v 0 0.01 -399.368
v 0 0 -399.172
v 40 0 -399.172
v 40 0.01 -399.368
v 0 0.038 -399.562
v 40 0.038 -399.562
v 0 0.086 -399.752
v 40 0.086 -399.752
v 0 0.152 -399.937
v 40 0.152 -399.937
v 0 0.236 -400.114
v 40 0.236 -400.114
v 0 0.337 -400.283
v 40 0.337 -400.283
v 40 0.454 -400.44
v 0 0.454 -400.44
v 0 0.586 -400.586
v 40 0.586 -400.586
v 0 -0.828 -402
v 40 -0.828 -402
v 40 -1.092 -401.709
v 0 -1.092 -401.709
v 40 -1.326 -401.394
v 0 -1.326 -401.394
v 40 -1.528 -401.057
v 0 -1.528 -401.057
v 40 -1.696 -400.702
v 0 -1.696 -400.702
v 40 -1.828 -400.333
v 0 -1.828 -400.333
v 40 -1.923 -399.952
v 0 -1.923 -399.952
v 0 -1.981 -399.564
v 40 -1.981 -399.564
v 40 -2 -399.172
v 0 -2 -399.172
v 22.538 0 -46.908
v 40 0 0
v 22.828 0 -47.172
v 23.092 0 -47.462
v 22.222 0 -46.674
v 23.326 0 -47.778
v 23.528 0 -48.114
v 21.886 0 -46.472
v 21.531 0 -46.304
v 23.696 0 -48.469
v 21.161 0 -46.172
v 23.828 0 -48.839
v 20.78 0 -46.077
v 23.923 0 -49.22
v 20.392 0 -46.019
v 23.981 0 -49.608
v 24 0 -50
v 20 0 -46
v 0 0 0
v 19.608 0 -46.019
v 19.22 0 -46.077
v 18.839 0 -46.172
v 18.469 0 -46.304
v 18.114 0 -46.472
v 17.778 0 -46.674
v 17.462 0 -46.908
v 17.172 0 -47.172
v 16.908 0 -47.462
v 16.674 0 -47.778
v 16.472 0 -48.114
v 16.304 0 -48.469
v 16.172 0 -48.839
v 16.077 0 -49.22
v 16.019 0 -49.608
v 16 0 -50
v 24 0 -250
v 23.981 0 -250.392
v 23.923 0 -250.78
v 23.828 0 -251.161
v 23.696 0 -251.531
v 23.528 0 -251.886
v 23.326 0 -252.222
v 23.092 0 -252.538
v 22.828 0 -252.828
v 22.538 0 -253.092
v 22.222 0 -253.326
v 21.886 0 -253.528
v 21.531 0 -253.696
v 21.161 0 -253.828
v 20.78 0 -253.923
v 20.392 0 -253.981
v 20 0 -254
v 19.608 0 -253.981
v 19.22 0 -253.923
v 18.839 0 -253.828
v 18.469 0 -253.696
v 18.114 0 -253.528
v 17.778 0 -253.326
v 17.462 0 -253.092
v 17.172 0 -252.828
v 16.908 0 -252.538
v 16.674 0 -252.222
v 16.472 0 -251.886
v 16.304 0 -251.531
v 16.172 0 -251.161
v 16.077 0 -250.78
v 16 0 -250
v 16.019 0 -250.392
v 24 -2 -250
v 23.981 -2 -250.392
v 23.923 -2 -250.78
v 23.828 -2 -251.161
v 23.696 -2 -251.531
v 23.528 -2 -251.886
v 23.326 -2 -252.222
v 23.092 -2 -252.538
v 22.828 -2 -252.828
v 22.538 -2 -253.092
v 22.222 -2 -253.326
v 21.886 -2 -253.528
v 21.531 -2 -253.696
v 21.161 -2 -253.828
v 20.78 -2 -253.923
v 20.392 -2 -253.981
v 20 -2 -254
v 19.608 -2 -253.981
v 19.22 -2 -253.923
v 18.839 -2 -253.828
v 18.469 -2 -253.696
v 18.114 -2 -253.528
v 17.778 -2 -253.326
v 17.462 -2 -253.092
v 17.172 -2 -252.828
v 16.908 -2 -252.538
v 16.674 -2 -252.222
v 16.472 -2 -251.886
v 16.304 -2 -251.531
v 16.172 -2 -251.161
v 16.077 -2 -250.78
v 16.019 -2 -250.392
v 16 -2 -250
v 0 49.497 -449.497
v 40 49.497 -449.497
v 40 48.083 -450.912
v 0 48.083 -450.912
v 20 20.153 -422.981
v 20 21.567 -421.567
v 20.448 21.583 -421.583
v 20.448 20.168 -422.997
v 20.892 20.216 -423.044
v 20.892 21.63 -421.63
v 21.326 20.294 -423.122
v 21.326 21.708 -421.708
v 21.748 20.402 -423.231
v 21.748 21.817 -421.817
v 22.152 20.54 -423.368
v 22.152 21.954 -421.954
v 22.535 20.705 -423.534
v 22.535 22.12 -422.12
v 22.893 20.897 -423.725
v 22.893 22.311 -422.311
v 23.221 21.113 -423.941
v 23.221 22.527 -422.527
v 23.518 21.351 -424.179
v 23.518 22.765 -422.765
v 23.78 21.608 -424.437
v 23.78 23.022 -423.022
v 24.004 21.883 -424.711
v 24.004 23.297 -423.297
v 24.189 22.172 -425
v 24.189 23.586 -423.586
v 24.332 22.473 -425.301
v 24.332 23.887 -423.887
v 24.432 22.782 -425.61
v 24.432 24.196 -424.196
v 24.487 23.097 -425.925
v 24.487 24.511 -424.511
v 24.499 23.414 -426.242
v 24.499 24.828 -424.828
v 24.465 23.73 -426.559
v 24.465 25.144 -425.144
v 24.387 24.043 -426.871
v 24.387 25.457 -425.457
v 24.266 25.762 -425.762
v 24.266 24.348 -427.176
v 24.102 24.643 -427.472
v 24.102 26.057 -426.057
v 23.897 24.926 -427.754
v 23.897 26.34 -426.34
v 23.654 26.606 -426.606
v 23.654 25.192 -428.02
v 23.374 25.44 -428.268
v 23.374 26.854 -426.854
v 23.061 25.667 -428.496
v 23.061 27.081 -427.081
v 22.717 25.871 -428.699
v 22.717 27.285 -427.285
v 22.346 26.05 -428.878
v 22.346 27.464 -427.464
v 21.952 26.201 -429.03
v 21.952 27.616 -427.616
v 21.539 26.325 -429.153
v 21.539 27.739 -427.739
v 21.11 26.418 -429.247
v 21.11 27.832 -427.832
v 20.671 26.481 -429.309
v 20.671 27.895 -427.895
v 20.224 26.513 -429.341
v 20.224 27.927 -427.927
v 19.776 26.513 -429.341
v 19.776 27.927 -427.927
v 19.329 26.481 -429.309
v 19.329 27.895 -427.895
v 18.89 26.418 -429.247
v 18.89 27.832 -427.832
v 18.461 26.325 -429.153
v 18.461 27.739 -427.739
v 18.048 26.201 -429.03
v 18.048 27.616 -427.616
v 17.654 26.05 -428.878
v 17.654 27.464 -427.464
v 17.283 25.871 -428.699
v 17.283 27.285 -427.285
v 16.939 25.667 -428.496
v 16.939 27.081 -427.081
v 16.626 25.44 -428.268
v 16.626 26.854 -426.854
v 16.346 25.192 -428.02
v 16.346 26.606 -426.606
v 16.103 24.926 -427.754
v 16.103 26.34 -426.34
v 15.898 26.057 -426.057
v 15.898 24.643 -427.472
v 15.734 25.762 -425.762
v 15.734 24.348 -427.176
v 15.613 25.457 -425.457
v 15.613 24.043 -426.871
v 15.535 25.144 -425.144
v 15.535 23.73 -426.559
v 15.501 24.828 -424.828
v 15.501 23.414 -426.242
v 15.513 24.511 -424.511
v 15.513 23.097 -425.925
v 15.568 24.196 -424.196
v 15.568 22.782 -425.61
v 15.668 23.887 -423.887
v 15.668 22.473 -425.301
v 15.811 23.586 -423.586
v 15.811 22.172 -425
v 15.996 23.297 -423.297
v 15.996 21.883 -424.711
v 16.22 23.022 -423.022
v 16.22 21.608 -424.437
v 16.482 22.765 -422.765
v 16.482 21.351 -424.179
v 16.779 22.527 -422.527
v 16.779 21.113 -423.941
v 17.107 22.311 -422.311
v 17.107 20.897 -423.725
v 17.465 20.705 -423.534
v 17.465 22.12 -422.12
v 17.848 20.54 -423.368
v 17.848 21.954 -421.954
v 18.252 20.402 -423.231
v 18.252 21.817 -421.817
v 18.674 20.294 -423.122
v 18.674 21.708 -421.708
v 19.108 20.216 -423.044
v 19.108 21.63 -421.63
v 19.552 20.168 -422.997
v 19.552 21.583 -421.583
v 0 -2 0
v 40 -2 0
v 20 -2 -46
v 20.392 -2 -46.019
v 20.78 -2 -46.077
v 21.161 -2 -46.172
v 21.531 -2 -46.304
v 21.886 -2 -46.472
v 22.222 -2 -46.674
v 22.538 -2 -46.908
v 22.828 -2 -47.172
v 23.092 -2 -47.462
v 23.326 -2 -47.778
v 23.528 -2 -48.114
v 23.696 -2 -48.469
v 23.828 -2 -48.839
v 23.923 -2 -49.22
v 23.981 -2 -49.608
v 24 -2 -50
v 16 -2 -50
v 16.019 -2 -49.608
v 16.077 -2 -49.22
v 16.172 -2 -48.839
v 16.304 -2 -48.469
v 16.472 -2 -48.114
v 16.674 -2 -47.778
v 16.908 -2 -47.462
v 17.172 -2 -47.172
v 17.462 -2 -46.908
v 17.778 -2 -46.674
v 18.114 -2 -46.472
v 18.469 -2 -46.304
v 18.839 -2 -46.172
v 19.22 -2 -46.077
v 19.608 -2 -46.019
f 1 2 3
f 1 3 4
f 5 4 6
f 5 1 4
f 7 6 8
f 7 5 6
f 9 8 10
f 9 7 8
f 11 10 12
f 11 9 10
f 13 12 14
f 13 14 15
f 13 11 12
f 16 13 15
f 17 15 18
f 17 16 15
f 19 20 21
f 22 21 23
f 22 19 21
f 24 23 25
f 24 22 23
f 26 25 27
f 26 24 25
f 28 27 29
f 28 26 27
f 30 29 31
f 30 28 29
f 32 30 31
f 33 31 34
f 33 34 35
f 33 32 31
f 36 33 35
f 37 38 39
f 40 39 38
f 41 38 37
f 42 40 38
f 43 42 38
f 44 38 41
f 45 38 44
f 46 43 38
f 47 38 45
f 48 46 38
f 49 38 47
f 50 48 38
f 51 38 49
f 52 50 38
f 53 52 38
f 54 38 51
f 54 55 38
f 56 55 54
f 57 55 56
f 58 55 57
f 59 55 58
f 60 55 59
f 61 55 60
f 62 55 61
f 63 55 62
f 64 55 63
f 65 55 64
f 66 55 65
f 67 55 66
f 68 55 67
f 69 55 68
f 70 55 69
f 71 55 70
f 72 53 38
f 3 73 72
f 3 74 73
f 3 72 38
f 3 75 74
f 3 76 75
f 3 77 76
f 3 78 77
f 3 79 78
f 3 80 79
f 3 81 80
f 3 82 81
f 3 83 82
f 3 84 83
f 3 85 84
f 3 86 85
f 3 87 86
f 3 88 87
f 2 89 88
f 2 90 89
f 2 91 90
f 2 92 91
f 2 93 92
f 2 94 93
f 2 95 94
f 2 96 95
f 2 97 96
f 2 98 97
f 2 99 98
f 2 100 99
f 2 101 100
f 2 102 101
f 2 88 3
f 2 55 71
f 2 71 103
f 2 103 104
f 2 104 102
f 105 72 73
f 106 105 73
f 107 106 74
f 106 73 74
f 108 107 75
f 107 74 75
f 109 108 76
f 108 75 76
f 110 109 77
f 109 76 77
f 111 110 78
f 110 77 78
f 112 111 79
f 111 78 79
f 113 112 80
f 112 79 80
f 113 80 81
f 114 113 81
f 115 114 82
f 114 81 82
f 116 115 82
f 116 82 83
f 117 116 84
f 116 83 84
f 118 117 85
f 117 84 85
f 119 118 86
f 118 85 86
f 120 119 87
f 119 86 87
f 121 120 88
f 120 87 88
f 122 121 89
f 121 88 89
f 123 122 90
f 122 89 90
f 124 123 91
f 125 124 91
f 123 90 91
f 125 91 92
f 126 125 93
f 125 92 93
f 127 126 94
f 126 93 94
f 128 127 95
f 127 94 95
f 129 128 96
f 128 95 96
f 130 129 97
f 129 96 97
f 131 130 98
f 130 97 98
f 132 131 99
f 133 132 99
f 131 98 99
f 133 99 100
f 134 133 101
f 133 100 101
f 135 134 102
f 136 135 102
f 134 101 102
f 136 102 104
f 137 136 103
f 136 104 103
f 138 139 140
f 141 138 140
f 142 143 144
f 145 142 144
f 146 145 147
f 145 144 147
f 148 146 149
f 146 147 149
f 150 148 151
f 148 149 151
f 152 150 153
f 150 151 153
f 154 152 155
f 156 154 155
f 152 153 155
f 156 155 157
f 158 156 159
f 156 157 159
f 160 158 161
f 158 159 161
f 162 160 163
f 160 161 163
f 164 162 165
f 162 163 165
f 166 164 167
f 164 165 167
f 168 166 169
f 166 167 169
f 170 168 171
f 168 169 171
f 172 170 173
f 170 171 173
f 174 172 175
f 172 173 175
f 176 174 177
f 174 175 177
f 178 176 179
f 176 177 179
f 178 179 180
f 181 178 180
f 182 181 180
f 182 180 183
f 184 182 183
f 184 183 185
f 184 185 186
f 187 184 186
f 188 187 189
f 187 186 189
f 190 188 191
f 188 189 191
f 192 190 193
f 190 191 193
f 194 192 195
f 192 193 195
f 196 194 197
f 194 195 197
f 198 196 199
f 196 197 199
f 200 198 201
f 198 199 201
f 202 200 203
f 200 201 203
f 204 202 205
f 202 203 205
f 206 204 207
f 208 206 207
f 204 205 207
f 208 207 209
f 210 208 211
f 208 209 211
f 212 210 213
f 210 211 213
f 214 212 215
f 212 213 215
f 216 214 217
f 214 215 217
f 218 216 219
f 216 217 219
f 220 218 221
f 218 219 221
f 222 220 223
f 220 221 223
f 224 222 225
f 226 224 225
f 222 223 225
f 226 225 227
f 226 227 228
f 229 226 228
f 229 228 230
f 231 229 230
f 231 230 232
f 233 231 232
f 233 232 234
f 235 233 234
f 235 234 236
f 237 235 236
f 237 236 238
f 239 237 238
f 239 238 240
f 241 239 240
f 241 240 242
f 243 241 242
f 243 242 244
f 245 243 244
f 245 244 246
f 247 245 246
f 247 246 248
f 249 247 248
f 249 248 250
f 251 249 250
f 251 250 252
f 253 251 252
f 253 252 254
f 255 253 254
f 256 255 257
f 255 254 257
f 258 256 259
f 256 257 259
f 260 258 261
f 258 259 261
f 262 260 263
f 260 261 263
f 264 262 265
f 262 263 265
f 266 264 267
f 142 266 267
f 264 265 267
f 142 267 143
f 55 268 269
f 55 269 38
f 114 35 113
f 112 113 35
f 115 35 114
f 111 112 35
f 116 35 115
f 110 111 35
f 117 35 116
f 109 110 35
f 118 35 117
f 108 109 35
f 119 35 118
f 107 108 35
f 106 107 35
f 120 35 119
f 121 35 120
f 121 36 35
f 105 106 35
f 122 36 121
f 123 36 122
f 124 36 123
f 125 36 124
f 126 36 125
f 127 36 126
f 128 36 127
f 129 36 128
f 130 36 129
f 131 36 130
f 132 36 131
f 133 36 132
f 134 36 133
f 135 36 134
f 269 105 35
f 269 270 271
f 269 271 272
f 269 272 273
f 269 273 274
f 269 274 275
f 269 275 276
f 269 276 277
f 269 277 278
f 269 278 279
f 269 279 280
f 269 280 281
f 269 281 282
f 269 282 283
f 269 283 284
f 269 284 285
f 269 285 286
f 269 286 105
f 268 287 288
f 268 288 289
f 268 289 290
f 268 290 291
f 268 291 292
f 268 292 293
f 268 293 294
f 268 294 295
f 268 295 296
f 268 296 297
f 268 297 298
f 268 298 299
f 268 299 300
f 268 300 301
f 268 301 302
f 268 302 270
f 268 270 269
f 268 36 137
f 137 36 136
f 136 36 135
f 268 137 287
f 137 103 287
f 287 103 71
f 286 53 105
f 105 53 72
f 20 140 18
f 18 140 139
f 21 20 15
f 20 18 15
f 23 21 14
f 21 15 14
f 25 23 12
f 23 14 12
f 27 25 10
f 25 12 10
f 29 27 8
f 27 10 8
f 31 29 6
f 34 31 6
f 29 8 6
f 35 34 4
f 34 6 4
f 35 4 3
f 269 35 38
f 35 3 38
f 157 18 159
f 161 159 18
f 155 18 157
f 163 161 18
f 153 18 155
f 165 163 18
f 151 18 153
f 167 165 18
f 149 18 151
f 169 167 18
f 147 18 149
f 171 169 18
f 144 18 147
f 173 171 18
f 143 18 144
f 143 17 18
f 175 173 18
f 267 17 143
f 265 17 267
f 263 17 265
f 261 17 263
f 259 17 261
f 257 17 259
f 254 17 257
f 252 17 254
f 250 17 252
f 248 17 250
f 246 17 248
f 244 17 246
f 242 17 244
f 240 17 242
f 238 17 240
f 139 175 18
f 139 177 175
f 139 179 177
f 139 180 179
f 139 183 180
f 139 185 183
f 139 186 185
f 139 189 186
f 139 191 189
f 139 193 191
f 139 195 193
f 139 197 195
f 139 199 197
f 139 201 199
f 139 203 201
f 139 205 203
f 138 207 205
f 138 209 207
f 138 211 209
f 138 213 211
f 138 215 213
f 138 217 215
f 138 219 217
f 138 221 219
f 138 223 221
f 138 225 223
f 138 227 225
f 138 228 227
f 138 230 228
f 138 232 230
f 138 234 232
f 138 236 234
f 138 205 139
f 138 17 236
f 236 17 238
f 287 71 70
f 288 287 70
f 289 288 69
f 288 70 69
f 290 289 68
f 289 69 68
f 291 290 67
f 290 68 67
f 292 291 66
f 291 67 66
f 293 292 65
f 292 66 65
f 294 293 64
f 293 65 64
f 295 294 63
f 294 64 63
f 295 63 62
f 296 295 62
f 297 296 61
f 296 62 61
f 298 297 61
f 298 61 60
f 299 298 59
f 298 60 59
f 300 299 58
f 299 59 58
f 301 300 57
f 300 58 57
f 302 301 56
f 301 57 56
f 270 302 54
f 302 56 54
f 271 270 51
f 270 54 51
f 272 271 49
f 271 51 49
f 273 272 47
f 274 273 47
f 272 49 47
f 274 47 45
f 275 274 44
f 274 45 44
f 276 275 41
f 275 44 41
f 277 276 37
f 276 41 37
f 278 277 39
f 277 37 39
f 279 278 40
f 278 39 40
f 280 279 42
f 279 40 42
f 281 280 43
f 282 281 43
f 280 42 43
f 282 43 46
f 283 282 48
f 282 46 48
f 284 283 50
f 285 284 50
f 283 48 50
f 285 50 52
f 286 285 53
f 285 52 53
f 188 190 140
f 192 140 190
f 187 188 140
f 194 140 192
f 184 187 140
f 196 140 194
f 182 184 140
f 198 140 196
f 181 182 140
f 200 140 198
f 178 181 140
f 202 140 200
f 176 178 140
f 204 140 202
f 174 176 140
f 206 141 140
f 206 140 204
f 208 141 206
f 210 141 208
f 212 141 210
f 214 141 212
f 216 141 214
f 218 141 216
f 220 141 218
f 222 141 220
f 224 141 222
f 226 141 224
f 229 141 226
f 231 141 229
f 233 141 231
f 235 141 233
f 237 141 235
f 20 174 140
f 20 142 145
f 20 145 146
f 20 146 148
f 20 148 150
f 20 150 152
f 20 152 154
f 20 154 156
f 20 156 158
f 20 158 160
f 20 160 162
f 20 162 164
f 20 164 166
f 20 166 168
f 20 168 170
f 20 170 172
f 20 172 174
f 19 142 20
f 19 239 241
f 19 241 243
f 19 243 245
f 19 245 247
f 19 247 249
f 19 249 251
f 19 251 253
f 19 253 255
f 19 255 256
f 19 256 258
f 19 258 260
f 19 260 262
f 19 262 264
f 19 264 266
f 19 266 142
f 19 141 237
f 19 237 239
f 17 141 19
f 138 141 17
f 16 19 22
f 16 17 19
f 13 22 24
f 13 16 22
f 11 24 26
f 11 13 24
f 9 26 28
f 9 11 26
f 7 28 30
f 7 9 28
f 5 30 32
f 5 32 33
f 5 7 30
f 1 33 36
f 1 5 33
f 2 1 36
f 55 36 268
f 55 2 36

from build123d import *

# Parameters (mm, degrees)
BASE_FLANGE1_DEPTH = 40
SKETCH7_R          = 4.5
CUT_EXTRUDE1_DEPTH = 2
CUT_EXTRUDE2_DEPTH = 2


# Sheet-metal steps are written as plain solids
with BuildPart() as part:
    # Sketch1 → Base-Flange1 (new body)
    with BuildSketch(Plane(origin=(0, 0, 0), x_dir=(0, 0, -1), z_dir=(1, 0, 0))):
        with BuildLine():
            Line((0, 0), (399.171572875, 0))
            ThreePointArc((399.171572875, 0), (399.93693974, 0.152240935), (400.585786438, 0.585786438))
            Line((400.585786438, 0.585786438), (449.497474683, 49.497474683))
            Line((449.497474683, 49.497474683), (450.911688245, 48.083261121))
            Line((450.911688245, 48.083261121), (402, -0.828427125))
            ThreePointArc((402, -0.828427125), (400.702306605, -1.69551813), (399.171572875, -2))
            Line((399.171572875, -2), (0, -2))
            Line((0, -2), (0, 0))
        make_face()
    extrude(amount=BASE_FLANGE1_DEPTH)

    # Sketch7 → Cut-Extrude1 (cut)
    with BuildSketch(Plane(origin=(0, -200, -200), x_dir=(1, 0, 0), z_dir=(0, 0.7071067811865456, 0.7071067811865496))):
        with Locations(Location((20, 317.842712475, 0), (0, 0, 270))):
            Circle(SKETCH7_R)
    extrude(amount=-CUT_EXTRUDE1_DEPTH, mode=Mode.SUBTRACT)

    # Sketch8 → Cut-Extrude2 (cut)
    with BuildSketch(Plane(origin=(0, 0, 0), x_dir=(1, 0, 0), z_dir=(0, 1, 0))):
        with BuildLine():
            Line((24, 50), (24, 250))
            ThreePointArc((24, 250), (20, 254), (16, 250))
            Line((16, 250), (16, 50))
            ThreePointArc((16, 50), (20, 46), (24, 50))
        make_face()
    extrude(amount=-CUT_EXTRUDE2_DEPTH, mode=Mode.SUBTRACT)


solid = part.part
